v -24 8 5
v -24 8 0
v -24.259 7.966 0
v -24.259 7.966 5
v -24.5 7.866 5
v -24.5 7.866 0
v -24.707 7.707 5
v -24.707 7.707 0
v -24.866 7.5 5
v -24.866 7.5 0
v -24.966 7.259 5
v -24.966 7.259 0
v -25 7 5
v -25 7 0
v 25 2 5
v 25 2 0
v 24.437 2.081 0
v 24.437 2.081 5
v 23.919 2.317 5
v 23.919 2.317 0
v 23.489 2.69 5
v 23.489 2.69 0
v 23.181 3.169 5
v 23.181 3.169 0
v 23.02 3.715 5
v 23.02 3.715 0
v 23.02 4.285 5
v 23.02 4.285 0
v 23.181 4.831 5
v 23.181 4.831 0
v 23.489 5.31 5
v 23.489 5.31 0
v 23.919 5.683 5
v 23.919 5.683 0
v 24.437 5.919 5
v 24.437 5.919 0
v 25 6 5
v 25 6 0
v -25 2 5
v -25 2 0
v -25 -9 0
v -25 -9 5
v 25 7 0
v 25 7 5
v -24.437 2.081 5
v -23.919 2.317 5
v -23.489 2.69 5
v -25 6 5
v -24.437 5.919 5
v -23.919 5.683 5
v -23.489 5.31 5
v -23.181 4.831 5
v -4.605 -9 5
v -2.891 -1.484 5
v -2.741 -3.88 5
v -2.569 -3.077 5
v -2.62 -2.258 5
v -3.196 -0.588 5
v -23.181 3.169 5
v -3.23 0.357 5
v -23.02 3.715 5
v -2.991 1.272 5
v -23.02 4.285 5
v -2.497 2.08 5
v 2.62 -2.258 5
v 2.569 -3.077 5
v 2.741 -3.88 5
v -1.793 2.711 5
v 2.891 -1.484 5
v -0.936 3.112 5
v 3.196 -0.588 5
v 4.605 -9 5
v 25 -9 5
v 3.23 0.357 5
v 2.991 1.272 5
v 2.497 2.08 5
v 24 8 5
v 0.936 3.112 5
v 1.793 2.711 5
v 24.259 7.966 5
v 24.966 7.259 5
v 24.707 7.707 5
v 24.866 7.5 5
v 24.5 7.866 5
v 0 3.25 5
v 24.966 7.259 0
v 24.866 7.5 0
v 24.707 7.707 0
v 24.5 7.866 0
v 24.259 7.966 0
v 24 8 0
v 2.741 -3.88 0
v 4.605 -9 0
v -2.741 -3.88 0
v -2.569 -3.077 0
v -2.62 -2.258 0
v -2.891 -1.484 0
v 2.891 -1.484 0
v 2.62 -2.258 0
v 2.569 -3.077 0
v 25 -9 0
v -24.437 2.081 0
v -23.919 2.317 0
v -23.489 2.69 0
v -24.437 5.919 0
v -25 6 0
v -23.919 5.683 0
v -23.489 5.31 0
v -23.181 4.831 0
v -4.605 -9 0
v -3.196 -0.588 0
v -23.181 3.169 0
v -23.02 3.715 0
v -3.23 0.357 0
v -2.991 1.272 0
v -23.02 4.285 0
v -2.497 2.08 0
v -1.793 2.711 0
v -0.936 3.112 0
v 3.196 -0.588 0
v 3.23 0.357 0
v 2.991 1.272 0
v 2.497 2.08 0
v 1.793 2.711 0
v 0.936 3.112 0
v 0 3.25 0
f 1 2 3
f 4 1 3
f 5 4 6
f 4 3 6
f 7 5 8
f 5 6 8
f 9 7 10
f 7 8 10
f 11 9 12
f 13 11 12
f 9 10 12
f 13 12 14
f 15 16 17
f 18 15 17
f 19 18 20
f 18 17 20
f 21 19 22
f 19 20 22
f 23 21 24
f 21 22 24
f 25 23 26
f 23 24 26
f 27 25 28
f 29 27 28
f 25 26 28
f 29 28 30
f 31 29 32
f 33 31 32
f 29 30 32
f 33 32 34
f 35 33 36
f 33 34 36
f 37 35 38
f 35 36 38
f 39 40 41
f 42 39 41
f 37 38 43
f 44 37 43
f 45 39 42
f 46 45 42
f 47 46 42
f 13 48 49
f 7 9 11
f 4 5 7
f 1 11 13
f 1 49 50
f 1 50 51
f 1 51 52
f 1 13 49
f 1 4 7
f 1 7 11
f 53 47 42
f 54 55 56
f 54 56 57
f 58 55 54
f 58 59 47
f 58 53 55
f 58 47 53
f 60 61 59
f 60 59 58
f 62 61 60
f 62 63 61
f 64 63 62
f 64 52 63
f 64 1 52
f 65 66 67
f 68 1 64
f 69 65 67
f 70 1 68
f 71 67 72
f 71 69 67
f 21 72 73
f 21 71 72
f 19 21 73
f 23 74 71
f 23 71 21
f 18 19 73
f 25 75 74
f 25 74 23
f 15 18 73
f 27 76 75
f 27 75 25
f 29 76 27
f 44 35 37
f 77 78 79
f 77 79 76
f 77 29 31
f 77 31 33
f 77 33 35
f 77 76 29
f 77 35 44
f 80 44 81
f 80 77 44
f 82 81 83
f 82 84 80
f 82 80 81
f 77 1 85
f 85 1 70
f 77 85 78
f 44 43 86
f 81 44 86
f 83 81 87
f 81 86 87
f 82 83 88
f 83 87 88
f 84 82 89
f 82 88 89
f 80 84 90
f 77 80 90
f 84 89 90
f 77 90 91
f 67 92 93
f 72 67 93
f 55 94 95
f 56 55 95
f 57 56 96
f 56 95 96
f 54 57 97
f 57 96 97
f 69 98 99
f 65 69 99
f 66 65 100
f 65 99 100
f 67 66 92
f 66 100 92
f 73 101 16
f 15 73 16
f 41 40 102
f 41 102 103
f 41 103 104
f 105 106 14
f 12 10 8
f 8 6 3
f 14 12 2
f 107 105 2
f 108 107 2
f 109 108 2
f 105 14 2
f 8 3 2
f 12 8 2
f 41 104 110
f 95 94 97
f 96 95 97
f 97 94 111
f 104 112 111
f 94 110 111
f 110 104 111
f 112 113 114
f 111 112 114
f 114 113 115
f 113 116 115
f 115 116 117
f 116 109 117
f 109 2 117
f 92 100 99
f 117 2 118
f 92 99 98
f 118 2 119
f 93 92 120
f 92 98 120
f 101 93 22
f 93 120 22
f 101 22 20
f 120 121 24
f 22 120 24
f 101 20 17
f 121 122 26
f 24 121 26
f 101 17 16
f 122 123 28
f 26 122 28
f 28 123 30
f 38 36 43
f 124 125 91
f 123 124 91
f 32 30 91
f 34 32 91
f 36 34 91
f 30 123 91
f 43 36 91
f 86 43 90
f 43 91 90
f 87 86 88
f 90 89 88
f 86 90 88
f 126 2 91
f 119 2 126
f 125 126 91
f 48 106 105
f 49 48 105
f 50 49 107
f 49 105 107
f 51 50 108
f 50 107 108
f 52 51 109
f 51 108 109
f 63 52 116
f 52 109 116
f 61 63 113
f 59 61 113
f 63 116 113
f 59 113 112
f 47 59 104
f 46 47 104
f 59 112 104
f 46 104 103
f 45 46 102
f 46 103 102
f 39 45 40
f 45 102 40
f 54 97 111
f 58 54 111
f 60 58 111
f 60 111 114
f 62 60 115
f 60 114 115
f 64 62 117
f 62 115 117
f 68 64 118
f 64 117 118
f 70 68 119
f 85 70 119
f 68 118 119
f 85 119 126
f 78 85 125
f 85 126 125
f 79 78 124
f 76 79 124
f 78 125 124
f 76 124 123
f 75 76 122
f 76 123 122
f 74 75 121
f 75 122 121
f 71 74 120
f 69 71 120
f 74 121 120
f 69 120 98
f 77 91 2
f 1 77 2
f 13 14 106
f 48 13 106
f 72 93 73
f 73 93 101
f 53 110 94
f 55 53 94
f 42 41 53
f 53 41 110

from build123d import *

# Parameters (mm, degrees)
F1_DEPTH = 5


with BuildPart() as f1:
    # F0 (on Top) → F1 (new body)
    with BuildSketch(Plane.XY):
        with BuildLine():
            ThreePointArc((-2.891459, -1.483901), (0, 3.25), (2.891459, -1.483901))
            ThreePointArc((2.891459, -1.483901), (2.566364, -2.666148), (2.741421, -3.879717))
            Line((2.741421, -3.879717), (4.605052, -9))
            Line((4.605052, -9), (25, -9))
            Line((25, -9), (25, 2))
            ThreePointArc((25, 2), (23, 4), (25, 6))
            Line((25, 6), (25, 7))
            ThreePointArc((25, 7), (24.707107, 7.707107), (24, 8))
            Line((24, 8), (-24, 8))
            ThreePointArc((-24, 8), (-24.707107, 7.707107), (-25, 7))
            Line((-25, 7), (-25, 6))
            ThreePointArc((-25, 6), (-23, 4), (-25, 2))
            Line((-25, 2), (-25, -9))
            Line((-25, -9), (-4.605052, -9))
            Line((-4.605052, -9), (-2.741421, -3.879717))
            ThreePointArc((-2.741421, -3.879717), (-2.566364, -2.666148), (-2.891459, -1.483901))
        make_face()
    extrude(amount=F1_DEPTH)


solid = f1.part
